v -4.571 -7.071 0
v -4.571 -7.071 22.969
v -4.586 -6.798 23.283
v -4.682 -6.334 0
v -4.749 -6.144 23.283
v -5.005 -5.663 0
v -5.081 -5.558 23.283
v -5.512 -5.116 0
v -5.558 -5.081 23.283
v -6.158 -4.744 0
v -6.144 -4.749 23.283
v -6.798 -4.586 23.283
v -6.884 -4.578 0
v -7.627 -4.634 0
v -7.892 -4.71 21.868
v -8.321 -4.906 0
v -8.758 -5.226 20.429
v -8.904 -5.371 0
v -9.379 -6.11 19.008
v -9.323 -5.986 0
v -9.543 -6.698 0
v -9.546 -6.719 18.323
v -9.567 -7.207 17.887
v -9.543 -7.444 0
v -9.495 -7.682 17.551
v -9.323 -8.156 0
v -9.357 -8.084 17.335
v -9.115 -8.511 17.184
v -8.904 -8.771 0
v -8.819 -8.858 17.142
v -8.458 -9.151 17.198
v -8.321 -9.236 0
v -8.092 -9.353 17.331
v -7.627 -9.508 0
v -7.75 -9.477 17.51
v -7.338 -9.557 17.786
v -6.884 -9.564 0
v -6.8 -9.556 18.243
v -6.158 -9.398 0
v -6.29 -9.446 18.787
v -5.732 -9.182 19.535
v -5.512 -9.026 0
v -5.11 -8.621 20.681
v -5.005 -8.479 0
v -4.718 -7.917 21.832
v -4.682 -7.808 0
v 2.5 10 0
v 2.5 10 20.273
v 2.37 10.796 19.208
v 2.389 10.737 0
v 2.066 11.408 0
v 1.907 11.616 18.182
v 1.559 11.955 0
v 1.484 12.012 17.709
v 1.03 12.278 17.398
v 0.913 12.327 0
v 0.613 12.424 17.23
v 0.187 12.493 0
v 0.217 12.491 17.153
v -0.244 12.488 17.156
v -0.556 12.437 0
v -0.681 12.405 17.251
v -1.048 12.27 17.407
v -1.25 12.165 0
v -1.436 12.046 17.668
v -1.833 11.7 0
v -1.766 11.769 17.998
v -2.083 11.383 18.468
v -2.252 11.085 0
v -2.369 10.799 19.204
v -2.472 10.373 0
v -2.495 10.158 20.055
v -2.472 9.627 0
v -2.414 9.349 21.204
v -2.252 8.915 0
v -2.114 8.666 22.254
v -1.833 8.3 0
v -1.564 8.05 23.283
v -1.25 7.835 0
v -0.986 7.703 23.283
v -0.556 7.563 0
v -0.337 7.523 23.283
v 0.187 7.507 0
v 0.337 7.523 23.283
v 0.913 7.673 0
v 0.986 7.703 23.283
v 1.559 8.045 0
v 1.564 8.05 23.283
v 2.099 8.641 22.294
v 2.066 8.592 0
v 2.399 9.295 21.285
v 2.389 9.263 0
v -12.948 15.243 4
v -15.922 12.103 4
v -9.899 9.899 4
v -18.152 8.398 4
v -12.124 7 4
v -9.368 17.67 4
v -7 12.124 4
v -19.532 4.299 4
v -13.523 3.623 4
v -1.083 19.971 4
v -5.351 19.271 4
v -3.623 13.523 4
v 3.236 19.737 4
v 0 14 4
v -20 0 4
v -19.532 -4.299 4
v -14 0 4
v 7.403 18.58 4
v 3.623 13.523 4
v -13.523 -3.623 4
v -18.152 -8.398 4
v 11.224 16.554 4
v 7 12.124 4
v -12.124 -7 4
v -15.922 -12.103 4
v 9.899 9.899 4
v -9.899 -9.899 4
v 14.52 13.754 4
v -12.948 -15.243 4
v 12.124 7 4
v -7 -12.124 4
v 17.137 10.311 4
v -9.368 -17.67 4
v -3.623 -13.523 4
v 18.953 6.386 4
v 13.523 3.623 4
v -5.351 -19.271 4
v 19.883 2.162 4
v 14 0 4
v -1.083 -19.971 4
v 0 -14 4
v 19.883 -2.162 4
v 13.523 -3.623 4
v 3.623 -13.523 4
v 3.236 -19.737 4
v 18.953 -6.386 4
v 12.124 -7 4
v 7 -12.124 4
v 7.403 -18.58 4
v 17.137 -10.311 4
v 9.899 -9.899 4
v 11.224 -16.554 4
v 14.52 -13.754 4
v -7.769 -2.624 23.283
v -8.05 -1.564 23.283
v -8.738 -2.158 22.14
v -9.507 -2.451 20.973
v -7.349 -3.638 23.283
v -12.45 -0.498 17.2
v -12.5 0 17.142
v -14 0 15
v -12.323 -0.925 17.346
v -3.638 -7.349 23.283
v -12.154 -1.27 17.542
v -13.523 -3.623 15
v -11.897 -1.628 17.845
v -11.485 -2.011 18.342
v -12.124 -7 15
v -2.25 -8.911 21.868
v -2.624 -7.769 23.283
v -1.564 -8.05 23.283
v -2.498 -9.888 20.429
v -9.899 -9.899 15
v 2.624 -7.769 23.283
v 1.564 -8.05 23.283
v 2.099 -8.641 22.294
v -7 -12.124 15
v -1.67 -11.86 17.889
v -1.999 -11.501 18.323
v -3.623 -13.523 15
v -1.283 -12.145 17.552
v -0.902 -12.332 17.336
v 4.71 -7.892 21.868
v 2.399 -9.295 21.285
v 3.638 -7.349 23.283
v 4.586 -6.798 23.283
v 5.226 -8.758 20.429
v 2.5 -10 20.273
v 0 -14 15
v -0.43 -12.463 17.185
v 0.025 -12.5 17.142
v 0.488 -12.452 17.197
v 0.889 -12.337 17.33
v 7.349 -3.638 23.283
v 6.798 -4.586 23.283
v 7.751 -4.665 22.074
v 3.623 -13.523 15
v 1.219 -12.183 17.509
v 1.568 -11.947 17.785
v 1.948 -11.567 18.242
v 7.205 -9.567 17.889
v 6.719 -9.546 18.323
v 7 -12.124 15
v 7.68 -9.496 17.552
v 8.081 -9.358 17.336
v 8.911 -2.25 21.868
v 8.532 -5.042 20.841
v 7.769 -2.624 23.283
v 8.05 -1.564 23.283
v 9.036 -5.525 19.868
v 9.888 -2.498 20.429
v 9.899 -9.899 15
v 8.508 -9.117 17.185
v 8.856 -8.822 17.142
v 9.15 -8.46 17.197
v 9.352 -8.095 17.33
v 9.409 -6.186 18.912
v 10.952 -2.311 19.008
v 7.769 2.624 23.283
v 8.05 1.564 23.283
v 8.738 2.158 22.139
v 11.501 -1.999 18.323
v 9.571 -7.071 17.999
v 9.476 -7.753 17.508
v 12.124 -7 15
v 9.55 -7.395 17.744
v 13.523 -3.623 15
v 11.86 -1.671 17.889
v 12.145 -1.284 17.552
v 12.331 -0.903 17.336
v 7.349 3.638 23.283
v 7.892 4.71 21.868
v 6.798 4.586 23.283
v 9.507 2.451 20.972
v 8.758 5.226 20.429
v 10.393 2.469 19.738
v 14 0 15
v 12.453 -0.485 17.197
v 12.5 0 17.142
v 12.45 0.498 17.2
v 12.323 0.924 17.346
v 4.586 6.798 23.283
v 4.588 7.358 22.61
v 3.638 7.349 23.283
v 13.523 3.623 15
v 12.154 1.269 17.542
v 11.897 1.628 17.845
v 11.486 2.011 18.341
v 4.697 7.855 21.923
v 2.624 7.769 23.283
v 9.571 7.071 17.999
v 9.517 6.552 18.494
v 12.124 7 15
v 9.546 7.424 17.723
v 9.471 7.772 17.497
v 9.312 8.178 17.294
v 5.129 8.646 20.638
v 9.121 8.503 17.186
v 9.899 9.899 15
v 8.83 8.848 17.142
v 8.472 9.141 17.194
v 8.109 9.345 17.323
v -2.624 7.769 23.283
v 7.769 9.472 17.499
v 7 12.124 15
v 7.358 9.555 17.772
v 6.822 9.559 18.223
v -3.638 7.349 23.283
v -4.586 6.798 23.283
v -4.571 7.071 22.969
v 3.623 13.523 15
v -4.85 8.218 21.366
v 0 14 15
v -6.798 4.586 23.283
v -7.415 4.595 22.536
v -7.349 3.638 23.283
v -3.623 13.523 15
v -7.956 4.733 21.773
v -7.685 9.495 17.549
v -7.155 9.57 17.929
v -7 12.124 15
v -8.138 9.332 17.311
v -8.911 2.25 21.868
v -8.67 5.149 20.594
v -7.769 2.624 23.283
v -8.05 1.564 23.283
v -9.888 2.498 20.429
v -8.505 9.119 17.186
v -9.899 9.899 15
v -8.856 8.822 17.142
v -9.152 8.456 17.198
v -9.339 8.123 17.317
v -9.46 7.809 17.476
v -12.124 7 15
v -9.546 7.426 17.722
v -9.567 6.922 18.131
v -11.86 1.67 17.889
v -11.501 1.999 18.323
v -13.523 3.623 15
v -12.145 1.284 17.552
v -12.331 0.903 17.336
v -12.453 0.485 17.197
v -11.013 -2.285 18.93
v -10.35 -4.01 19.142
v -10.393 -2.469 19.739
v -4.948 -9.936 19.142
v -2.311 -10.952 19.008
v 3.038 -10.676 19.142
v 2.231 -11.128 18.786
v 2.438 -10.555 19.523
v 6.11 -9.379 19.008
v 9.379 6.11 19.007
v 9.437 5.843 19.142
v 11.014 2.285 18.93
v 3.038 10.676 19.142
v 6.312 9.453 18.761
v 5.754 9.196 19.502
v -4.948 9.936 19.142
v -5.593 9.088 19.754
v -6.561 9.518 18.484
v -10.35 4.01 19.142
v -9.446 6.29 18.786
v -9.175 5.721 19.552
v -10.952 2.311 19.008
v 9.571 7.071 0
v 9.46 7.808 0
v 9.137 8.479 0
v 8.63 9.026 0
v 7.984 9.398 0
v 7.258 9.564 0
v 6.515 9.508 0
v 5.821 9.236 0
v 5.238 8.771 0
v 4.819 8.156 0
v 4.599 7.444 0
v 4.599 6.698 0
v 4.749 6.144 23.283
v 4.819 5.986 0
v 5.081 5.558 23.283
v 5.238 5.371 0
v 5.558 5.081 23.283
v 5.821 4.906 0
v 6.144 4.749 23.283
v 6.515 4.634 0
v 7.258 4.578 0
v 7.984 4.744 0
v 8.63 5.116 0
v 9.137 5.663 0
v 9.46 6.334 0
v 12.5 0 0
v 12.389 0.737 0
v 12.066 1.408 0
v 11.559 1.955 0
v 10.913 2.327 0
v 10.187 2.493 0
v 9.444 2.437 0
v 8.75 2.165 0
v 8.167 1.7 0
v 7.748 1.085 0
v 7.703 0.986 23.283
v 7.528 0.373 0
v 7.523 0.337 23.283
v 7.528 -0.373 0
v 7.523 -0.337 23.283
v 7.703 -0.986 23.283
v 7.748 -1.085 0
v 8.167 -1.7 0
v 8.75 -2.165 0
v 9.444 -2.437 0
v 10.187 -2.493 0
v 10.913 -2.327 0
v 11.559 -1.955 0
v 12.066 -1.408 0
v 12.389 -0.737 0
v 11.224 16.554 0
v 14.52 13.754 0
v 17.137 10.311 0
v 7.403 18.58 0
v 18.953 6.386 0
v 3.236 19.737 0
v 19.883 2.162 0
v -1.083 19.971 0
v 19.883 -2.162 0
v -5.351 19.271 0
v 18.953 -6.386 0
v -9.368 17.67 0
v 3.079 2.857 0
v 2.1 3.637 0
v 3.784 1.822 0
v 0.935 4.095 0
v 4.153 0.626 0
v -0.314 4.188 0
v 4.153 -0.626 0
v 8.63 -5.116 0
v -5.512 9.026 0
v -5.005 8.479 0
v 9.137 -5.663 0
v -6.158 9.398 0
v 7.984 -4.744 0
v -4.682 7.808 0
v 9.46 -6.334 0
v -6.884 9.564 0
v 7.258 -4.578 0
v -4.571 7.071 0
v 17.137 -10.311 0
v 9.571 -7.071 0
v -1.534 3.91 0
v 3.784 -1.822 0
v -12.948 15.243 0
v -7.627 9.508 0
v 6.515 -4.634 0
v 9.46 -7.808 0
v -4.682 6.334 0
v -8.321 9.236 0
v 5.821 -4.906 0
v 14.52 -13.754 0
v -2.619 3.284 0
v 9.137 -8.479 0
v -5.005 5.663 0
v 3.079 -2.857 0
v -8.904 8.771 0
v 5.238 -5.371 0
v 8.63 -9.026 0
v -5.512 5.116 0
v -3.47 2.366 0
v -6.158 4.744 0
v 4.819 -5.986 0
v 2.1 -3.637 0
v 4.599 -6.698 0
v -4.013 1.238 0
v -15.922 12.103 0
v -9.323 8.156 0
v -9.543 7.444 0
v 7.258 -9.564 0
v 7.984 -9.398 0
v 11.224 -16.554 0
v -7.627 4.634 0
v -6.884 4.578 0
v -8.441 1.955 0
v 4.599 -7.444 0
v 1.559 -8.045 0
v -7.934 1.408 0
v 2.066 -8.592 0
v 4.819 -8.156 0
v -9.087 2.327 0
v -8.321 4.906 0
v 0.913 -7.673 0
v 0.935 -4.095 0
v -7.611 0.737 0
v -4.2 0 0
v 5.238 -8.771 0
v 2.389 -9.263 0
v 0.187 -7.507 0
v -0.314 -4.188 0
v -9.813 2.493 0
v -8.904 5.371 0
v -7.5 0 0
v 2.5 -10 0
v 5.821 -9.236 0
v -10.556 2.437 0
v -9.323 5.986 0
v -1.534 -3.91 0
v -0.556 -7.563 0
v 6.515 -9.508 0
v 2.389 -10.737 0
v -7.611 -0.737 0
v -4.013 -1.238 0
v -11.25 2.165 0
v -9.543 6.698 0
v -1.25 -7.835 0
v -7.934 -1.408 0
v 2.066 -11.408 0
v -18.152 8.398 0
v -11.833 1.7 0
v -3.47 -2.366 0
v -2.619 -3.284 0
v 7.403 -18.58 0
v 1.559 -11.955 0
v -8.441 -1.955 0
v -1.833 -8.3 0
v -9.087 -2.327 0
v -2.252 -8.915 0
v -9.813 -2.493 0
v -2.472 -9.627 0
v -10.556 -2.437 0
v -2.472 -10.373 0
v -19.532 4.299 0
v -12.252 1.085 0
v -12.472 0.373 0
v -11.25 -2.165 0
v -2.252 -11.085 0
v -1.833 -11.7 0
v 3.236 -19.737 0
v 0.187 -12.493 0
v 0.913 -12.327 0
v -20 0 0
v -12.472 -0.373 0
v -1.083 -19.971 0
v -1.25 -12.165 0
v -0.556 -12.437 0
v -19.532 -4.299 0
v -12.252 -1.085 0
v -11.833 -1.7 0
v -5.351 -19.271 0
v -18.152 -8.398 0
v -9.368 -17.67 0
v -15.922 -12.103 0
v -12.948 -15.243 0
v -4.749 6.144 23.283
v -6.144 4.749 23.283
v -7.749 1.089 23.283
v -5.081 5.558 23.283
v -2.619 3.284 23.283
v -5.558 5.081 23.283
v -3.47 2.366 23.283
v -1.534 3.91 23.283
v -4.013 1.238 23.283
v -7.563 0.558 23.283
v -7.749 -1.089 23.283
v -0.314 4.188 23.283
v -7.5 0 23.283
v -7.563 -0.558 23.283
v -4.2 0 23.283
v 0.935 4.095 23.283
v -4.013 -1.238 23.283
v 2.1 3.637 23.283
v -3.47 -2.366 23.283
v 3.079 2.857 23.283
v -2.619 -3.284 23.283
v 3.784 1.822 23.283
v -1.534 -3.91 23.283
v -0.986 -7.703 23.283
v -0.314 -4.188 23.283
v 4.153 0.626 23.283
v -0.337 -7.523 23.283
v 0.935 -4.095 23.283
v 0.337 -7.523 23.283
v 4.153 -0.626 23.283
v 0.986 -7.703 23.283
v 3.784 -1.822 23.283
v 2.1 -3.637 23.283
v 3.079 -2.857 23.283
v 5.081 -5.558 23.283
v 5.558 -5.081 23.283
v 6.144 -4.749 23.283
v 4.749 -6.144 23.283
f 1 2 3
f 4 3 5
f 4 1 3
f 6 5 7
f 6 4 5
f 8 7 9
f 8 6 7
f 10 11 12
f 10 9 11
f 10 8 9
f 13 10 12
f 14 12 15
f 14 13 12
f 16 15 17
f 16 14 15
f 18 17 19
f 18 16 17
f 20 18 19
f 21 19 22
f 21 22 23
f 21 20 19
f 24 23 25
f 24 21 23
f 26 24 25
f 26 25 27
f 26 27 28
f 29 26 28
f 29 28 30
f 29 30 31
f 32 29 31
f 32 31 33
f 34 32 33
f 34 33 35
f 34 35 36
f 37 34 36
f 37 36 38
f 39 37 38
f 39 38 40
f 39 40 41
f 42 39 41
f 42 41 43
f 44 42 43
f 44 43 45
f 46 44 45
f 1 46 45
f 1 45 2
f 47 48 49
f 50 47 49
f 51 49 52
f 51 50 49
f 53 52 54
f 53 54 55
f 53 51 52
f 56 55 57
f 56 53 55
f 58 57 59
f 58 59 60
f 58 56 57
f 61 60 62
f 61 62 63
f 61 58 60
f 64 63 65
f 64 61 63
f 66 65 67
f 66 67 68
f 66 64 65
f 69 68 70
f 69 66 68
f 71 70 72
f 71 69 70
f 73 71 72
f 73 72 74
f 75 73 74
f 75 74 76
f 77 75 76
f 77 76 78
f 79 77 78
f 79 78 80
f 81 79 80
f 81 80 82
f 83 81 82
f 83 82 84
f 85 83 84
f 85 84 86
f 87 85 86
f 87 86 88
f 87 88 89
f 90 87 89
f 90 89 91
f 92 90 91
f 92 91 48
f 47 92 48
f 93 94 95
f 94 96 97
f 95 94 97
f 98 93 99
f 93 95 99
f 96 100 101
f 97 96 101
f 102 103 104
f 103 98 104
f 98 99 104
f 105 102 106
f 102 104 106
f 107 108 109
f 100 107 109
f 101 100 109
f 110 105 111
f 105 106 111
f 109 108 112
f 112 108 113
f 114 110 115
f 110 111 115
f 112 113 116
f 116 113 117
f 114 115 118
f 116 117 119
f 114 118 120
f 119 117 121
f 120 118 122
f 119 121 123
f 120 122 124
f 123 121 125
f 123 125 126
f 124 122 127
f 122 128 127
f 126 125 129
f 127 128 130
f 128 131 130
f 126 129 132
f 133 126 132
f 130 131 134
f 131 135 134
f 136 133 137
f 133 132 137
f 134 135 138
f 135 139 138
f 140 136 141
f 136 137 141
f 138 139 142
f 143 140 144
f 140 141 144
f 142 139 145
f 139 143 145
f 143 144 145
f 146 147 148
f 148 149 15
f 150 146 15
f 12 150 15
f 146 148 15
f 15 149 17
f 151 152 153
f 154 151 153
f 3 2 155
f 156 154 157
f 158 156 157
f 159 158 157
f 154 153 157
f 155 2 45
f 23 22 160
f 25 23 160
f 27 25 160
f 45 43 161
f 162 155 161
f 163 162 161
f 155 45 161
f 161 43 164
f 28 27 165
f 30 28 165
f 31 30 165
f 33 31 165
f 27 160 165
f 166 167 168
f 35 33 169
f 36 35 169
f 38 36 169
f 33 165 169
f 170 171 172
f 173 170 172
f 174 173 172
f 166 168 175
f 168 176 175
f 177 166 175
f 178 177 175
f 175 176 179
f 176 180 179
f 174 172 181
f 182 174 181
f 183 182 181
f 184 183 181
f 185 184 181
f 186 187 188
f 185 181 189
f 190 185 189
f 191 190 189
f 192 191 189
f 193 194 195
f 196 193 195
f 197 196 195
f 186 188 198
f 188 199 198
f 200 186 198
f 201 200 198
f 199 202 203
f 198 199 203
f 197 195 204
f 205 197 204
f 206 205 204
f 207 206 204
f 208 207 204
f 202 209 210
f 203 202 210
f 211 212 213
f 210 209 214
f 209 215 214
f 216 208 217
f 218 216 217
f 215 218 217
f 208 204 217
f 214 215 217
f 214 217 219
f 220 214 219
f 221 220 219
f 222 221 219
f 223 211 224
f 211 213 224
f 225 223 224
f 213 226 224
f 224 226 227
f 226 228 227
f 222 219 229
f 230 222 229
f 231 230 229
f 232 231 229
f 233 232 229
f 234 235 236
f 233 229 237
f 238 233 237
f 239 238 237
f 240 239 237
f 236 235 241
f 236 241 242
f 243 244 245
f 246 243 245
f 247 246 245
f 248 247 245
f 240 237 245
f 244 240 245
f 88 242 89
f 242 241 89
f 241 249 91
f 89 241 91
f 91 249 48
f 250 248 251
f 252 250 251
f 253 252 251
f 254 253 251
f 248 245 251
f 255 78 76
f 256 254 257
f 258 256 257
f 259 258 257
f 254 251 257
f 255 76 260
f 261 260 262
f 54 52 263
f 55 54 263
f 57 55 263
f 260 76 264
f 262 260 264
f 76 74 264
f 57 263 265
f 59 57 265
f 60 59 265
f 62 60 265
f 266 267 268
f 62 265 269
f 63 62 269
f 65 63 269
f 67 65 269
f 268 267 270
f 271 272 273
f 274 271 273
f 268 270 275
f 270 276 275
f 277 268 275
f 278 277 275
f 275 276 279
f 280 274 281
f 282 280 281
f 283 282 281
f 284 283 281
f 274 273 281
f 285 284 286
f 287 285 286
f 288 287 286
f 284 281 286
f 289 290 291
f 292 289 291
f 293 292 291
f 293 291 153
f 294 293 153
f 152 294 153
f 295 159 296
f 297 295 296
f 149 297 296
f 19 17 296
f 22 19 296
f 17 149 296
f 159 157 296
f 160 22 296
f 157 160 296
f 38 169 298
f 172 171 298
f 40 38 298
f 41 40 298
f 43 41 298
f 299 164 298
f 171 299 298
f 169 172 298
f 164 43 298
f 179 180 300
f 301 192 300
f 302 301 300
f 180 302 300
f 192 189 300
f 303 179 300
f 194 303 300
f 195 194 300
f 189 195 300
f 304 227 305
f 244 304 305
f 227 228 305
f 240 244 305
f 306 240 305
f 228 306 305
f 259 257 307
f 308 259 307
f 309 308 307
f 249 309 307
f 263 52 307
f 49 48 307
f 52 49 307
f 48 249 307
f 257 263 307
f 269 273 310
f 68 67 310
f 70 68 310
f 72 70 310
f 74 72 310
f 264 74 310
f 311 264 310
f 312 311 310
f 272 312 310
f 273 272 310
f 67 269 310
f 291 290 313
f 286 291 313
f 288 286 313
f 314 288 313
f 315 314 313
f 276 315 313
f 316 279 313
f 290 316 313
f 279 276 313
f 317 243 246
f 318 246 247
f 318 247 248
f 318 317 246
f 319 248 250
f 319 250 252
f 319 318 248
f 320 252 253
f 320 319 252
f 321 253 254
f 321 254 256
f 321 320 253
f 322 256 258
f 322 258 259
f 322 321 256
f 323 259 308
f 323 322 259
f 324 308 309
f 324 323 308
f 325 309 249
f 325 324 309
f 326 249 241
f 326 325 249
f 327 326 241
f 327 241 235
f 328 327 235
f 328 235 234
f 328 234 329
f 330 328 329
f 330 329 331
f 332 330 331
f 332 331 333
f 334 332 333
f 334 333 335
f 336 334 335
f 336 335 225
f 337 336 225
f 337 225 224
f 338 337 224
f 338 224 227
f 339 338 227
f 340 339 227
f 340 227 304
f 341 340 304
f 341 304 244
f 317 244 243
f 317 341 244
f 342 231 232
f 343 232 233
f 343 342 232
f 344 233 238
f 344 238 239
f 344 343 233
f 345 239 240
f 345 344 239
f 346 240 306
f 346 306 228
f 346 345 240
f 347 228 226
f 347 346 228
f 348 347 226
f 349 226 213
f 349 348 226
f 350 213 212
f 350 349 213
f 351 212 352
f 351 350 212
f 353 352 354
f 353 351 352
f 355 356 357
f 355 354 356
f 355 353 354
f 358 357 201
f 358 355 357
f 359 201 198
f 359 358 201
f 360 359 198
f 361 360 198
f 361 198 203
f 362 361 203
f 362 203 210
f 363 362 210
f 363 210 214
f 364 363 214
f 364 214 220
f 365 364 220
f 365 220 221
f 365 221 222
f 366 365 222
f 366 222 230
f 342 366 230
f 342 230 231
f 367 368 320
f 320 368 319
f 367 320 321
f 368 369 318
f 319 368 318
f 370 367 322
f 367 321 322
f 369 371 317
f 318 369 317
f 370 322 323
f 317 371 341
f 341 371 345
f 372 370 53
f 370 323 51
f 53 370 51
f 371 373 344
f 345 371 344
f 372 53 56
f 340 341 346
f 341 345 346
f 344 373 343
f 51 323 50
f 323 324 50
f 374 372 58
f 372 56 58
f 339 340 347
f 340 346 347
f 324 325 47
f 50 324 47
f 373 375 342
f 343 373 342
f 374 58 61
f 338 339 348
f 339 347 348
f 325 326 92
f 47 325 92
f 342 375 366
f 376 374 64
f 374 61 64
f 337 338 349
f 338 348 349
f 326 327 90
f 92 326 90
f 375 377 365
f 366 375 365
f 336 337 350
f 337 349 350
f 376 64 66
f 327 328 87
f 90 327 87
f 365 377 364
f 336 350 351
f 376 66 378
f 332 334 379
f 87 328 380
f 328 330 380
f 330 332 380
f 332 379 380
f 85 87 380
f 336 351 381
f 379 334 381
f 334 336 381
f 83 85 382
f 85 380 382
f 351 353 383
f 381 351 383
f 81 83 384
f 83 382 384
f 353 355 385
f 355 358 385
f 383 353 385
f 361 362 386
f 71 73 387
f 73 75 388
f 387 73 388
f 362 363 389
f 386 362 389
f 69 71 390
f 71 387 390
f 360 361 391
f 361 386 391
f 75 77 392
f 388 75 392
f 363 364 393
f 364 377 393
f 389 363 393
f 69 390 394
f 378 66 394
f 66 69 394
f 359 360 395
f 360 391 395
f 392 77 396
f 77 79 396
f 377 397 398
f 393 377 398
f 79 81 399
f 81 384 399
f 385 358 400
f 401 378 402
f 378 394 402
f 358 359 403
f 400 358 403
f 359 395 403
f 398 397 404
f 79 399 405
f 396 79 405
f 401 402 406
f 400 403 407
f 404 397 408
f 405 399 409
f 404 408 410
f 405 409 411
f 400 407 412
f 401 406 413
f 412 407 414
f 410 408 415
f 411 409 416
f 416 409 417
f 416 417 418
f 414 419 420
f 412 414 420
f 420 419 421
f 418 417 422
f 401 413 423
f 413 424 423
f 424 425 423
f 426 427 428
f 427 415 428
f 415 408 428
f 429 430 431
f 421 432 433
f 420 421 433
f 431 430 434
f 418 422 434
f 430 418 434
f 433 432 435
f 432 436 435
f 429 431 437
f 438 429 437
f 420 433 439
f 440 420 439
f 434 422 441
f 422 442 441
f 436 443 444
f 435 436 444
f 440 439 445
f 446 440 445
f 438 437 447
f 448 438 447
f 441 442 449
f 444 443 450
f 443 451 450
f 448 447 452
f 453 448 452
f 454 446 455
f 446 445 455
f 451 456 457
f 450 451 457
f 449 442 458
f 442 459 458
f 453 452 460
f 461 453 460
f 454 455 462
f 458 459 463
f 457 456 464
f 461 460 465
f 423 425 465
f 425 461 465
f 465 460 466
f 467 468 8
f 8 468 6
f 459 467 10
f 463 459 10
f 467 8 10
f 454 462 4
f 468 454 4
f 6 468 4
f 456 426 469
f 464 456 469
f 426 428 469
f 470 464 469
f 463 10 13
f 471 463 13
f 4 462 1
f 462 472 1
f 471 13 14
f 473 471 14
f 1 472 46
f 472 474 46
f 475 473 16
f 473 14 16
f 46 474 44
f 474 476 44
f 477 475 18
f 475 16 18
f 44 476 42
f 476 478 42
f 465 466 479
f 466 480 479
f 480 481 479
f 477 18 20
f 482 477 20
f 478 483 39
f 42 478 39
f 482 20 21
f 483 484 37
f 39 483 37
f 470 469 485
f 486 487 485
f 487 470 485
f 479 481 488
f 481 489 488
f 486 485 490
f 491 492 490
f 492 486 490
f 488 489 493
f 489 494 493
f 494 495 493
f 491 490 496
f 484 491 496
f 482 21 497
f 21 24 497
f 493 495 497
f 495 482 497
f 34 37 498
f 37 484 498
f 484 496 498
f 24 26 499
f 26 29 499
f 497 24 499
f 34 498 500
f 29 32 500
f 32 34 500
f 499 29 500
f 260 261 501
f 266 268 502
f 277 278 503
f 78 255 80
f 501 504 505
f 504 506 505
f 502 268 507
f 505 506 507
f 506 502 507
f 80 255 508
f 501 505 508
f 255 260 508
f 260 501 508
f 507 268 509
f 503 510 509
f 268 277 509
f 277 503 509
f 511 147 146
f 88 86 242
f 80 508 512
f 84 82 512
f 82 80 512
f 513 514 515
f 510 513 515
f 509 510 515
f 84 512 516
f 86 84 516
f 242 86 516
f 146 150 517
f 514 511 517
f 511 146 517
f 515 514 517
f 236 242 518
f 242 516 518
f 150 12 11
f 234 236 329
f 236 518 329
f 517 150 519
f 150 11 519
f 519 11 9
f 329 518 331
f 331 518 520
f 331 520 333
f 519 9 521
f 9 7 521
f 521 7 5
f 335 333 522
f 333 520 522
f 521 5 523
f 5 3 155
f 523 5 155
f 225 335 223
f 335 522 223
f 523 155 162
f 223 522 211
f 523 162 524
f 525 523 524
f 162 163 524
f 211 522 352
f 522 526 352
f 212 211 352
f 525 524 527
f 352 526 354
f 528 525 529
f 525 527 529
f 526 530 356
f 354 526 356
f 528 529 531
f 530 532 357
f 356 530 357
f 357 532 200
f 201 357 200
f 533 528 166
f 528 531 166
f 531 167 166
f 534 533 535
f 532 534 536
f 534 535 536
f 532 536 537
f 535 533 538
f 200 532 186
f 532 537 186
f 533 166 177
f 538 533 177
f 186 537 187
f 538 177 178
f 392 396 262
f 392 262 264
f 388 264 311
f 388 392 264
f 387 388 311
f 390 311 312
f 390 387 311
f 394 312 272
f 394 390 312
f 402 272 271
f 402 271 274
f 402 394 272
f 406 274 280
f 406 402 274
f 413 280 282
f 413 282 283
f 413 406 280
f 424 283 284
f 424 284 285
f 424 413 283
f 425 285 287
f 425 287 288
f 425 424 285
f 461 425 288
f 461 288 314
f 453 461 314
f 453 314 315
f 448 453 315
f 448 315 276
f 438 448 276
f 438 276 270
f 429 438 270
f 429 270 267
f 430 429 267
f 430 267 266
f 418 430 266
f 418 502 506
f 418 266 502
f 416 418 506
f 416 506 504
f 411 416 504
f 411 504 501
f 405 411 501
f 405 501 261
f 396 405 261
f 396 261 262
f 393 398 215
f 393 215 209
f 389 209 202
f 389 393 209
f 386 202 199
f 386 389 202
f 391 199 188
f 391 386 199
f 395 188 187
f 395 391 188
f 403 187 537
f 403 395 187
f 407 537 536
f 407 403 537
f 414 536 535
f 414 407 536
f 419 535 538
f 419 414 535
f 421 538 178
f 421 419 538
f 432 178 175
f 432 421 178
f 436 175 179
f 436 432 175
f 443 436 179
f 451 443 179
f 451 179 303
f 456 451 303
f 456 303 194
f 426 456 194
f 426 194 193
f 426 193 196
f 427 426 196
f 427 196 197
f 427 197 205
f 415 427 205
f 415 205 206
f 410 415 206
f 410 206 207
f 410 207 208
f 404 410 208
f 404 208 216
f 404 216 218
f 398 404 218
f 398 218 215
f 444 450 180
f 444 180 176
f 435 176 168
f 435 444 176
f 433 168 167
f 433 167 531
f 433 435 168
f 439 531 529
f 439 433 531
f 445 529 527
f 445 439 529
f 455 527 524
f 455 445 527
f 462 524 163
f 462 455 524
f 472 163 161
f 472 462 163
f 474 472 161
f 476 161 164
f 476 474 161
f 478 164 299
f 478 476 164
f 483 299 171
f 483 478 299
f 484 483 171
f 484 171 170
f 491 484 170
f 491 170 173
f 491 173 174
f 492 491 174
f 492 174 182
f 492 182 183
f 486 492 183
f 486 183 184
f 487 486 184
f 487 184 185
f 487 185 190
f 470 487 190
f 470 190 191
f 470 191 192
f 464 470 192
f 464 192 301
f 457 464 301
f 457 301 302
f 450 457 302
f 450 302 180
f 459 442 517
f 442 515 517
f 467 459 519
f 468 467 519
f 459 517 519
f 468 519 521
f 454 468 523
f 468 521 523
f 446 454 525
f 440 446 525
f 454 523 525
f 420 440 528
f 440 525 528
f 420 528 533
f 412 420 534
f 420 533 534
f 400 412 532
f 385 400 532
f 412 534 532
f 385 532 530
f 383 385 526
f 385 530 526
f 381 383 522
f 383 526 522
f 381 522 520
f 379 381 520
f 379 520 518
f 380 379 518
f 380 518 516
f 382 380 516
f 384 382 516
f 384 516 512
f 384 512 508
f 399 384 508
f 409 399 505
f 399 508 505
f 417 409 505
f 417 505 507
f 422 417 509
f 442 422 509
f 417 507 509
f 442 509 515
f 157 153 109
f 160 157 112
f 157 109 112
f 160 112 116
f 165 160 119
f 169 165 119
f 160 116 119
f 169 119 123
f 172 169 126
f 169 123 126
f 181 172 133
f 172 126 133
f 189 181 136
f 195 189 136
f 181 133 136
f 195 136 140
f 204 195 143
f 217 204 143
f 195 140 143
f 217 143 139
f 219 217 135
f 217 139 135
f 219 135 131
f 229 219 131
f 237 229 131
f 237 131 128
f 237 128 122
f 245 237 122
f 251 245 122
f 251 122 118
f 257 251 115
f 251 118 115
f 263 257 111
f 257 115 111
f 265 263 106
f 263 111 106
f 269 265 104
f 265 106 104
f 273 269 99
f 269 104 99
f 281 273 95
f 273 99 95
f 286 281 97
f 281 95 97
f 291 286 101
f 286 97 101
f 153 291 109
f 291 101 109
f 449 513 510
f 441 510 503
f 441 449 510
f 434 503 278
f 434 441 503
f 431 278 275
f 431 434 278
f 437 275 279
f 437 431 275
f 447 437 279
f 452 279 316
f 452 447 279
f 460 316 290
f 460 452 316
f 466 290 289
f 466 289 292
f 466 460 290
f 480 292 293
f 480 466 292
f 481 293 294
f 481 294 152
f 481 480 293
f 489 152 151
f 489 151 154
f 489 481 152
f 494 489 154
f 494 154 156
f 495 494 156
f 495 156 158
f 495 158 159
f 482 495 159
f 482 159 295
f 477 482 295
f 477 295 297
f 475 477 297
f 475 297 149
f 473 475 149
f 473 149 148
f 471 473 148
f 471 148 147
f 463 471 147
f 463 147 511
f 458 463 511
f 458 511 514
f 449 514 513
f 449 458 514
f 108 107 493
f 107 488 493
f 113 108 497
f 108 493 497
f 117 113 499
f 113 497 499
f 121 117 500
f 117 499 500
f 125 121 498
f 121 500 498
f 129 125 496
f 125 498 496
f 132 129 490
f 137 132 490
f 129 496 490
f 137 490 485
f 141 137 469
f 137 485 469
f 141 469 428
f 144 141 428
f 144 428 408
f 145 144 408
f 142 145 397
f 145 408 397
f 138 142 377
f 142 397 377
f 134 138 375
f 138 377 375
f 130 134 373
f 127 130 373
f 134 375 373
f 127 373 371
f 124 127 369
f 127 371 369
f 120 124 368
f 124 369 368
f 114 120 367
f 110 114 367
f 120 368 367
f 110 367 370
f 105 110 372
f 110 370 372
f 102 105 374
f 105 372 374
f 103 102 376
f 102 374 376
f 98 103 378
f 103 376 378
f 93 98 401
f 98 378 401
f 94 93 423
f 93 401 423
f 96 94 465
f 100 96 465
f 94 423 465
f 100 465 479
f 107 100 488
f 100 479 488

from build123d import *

# Parameters (mm, degrees)
F2_R     = 2.5
F3_DEPTH = 25


with BuildPart() as f1:
    # F0 (on Front) → F1 (revolve)
    with BuildSketch(Plane.XZ):
        Polygon((-20, 0), (-4.2, 0), (-4.2, 23.283258), (-8.2, 23.283258), (-14, 15), (-14, 4), (-20, 4), align=None)
    revolve(axis=Axis((0, 0, 31.447405), (0, 0, 1)))

    # F2 (on Top) → F3 (cut)
    with BuildSketch(Plane.XY):
        with Locations((0, -10)):
            Circle(F2_R)
        with Locations((7.071068, -7.071068)):
            Circle(F2_R)
        with Locations((10, 0)):
            Circle(F2_R)
        with Locations((7.071068, 7.071068)):
            Circle(F2_R)
        with Locations((0, 10)):
            Circle(F2_R)
        with Locations((-7.071068, 7.071068)):
            Circle(F2_R)
        with Locations((-10, 0)):
            Circle(F2_R)
        with Locations((-7.071068, -7.071068)):
            Circle(F2_R)
    extrude(amount=F3_DEPTH, mode=Mode.SUBTRACT)


solid = f1.part
